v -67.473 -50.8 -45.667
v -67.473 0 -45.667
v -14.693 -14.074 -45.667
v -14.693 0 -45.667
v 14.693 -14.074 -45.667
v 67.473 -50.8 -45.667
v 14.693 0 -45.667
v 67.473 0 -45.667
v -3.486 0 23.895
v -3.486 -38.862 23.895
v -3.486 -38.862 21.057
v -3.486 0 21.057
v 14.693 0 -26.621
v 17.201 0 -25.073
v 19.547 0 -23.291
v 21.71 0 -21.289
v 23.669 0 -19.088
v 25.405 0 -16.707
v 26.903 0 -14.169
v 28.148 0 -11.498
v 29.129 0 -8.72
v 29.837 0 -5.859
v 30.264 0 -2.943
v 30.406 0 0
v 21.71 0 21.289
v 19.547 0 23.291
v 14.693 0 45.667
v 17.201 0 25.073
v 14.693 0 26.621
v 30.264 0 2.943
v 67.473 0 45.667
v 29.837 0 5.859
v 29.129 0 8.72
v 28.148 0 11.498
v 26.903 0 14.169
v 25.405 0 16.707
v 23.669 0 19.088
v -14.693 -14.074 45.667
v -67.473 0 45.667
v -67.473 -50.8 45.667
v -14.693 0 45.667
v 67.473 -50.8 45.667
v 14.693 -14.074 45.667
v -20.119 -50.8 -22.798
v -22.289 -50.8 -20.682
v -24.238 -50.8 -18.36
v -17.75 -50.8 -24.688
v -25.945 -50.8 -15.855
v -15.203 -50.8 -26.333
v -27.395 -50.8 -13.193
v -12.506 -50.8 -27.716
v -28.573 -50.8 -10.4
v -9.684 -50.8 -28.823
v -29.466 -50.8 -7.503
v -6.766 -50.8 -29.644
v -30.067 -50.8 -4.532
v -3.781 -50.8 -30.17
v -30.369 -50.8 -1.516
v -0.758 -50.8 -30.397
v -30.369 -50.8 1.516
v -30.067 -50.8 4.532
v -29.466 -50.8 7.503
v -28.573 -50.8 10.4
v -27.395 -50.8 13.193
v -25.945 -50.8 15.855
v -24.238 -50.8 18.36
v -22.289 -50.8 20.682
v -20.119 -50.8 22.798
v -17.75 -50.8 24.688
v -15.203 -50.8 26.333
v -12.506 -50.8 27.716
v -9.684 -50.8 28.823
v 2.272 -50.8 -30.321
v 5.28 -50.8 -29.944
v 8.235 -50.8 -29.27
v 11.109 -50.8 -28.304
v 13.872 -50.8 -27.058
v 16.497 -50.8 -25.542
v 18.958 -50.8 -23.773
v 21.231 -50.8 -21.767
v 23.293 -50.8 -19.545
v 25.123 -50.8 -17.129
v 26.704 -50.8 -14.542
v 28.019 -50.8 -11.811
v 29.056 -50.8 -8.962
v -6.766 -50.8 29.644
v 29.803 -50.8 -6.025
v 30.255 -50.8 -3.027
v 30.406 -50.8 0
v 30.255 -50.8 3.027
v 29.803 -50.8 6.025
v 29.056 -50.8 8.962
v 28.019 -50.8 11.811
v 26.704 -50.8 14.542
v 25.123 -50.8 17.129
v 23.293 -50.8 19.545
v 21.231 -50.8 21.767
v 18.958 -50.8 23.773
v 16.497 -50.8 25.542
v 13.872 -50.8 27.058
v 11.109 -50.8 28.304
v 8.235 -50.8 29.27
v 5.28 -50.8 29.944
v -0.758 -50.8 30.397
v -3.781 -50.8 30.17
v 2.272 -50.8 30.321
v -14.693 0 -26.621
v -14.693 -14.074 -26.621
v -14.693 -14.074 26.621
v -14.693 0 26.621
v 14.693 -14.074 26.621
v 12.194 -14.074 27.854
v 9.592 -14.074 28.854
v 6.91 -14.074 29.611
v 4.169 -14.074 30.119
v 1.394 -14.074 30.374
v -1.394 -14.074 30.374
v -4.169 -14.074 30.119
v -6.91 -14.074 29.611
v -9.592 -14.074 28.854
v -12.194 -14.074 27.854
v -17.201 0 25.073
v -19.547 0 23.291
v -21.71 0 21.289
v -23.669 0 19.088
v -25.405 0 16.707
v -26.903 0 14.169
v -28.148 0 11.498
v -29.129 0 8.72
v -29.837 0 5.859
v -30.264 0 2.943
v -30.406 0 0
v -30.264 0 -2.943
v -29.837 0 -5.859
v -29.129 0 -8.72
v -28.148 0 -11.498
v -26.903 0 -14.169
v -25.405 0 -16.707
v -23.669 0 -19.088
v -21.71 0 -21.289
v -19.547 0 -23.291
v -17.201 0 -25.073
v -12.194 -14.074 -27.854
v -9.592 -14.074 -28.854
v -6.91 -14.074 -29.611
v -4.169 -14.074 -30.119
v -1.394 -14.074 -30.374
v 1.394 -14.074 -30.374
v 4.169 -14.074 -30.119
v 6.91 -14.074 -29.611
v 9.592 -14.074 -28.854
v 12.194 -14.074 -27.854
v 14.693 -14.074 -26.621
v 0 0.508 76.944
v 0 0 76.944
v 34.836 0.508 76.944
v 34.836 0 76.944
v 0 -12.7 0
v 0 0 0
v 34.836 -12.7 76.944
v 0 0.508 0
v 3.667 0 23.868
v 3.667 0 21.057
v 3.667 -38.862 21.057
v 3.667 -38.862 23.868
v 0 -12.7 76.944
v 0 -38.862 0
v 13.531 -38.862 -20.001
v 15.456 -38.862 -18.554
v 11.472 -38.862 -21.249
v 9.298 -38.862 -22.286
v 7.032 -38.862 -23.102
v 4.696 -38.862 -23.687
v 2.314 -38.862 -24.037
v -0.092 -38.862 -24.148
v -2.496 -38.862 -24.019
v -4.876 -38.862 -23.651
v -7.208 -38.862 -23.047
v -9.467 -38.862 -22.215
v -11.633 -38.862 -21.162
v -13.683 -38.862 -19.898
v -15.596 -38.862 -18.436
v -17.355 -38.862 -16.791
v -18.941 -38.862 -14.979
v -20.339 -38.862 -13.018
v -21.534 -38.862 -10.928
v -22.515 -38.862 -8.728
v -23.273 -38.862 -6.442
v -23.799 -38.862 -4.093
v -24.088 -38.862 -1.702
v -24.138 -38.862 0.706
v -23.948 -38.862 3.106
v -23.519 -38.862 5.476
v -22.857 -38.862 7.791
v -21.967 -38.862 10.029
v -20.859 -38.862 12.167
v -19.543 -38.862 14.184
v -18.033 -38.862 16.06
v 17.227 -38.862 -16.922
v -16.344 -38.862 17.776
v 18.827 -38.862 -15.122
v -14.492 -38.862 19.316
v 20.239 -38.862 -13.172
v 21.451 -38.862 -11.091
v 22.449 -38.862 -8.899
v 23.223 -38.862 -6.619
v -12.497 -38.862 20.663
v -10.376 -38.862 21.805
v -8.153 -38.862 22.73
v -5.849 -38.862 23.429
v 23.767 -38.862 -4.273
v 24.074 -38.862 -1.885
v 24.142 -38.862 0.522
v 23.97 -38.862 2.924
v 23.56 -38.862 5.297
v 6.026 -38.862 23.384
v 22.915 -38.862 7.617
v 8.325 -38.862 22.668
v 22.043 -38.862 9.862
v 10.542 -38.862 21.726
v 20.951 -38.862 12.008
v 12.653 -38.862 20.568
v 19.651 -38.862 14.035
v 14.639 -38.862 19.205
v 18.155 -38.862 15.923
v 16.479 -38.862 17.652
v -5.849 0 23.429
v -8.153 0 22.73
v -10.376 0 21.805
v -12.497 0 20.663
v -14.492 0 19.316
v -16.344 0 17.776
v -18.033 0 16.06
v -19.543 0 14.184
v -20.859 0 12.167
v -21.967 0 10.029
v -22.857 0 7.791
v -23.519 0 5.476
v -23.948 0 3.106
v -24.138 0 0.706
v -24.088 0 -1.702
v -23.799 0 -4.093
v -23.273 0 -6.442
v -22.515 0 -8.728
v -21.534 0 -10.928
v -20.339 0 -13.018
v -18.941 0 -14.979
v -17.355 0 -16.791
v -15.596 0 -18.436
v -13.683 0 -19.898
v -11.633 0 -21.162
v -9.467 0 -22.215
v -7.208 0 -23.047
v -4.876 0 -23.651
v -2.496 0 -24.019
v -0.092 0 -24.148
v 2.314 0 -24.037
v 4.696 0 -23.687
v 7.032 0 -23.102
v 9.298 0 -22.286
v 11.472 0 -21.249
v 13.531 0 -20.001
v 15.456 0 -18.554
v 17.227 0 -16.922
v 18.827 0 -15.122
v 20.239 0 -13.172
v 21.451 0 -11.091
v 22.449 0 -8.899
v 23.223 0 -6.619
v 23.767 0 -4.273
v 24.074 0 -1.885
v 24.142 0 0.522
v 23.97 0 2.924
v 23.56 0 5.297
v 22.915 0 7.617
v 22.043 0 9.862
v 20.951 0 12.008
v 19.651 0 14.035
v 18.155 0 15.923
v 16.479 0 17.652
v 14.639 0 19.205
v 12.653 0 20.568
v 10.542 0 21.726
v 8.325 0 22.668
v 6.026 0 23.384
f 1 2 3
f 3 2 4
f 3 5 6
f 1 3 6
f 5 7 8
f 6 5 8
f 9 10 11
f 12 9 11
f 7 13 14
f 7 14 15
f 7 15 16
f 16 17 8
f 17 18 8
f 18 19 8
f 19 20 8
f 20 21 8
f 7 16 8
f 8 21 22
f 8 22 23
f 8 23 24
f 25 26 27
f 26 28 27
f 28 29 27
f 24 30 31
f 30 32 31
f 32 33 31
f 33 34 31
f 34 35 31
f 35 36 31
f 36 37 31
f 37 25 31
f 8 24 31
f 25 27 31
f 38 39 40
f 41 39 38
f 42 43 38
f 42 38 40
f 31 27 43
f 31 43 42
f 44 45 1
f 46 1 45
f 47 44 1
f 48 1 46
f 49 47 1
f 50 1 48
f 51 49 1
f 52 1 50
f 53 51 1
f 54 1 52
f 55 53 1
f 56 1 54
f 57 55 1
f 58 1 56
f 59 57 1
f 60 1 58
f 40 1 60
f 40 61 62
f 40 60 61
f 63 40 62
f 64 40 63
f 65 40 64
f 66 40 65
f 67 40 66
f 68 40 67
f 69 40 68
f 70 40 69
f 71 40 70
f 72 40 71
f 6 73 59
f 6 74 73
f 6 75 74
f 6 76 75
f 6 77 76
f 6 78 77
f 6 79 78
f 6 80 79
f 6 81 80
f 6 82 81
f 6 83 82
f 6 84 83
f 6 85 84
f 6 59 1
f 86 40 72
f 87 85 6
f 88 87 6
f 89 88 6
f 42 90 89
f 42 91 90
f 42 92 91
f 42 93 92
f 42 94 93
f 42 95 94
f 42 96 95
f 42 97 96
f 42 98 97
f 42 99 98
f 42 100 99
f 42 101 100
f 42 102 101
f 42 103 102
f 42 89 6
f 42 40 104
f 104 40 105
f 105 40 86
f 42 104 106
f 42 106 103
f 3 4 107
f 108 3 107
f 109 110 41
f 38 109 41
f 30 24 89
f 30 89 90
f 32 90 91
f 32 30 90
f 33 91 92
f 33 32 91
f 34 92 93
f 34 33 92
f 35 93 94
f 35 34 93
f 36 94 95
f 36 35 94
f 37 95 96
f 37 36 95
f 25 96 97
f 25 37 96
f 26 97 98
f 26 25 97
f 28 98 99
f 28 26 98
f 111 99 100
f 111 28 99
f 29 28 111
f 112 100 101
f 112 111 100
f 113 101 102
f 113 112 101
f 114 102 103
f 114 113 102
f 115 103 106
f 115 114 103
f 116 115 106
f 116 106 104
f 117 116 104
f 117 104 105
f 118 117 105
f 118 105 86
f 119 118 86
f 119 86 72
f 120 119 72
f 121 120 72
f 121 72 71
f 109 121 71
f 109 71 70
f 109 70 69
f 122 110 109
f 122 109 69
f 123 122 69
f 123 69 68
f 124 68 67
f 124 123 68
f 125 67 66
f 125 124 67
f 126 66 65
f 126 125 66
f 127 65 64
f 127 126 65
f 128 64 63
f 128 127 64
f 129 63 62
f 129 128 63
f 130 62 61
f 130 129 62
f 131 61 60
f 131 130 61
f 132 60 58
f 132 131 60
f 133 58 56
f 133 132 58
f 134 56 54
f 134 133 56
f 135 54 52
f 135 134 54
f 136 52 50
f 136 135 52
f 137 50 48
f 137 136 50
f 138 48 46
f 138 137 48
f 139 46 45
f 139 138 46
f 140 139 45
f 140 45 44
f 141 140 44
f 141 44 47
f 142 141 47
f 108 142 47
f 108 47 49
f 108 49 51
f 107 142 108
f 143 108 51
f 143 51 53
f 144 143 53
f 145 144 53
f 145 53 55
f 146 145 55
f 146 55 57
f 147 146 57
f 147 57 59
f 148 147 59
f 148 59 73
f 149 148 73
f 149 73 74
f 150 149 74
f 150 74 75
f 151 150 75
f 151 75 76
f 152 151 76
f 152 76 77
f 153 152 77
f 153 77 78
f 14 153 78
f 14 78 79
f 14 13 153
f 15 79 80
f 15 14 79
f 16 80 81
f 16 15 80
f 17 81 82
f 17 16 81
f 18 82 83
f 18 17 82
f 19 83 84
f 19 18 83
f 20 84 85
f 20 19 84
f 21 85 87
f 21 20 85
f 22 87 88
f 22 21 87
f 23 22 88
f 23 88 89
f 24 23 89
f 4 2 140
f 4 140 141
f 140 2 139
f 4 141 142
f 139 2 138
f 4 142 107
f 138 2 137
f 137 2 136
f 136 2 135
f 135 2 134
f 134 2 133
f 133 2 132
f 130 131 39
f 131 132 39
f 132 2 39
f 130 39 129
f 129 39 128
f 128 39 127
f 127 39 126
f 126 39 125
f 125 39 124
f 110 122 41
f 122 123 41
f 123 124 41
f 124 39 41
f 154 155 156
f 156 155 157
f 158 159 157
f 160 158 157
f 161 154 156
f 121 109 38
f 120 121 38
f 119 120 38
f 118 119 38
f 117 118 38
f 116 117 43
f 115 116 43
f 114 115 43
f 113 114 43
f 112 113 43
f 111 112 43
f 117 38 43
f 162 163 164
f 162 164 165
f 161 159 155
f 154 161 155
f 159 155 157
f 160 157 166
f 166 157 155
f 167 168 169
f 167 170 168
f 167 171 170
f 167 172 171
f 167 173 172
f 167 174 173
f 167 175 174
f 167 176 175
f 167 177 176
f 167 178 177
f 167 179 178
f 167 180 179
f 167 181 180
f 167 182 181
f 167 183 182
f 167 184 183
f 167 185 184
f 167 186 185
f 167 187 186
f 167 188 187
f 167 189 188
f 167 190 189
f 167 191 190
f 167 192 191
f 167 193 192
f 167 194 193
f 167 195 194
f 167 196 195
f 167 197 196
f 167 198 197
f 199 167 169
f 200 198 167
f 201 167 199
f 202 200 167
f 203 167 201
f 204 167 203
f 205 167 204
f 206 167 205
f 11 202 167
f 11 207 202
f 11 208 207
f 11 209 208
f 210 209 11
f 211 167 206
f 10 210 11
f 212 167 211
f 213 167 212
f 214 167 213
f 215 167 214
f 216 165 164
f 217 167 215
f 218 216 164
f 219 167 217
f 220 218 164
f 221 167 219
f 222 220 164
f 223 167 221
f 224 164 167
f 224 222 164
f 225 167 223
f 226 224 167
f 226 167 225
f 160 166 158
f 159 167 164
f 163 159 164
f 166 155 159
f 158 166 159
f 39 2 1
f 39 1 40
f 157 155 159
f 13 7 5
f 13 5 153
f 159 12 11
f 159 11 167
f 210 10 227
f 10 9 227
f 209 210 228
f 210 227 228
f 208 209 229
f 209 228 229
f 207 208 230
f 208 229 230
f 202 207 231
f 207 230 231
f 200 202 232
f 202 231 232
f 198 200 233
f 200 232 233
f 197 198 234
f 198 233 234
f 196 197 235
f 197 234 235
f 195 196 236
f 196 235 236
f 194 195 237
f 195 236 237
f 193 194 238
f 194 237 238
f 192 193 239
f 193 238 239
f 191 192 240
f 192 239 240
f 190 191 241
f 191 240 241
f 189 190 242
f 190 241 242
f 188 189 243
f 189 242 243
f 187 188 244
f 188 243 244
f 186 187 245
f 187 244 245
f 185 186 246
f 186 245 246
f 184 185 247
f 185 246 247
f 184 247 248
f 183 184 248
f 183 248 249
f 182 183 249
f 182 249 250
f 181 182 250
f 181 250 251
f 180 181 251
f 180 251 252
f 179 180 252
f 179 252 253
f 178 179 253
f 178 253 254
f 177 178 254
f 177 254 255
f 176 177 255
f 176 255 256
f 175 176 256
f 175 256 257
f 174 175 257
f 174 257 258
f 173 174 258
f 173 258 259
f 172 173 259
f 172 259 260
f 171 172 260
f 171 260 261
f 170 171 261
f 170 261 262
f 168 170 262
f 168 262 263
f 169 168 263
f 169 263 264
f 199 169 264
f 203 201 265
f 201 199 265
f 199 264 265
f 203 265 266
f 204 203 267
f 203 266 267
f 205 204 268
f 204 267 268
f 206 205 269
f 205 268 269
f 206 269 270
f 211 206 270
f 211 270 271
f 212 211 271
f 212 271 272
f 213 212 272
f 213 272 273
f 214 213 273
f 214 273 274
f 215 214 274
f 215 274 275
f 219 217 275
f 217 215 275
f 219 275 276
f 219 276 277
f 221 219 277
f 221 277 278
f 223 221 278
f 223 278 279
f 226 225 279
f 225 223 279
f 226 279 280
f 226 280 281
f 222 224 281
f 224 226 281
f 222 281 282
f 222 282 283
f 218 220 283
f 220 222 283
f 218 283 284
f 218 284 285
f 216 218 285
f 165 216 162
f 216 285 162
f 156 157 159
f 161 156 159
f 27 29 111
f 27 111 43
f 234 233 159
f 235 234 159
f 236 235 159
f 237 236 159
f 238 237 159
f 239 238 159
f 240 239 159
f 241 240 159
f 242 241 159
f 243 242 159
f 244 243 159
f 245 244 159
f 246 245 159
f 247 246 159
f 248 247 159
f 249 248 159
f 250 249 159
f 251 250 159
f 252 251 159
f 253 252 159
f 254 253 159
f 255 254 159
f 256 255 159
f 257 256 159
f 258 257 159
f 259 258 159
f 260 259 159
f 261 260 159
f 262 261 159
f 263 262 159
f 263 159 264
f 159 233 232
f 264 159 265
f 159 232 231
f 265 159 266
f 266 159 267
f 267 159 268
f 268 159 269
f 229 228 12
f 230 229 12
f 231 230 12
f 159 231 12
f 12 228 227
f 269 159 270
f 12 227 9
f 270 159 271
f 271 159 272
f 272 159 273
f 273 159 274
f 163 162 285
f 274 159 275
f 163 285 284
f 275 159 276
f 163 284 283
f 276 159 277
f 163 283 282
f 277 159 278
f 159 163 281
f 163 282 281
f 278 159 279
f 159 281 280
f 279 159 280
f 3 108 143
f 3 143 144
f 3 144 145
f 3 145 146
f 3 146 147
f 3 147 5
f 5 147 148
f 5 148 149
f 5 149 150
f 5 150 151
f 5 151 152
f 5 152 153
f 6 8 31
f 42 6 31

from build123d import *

# Parameters (mm, degrees)
F0_W      = 134.946704
F0_H      = 91.333538
F0_R      = 30.406377
F1_DEPTH  = 50.8
F2_W      = 29.386342
F2_H      = 189.831882
F3_DEPTH  = 14.073627
F4_R      = 24.148146
F5_DEPTH  = 38.861794
F7_DEPTH  = 47.989102
F9_DEPTH  = 12.7
F10_DEPTH = 0.508


with BuildPart() as f1:
    # F0 (on Front) → F1 (new body)
    with BuildSketch(Plane.XZ):
        Rectangle(F0_W, F0_H)
        Circle(F0_R, mode=Mode.SUBTRACT)
    extrude(amount=F1_DEPTH)

    # F2 (on Front) → F3 (cut)
    with BuildSketch(Plane.XZ):
        Rectangle(F2_W, F2_H)
    extrude(amount=F3_DEPTH, mode=Mode.SUBTRACT)


with BuildPart() as f5:
    # F4 (on Front) → F5 (new body)
    with BuildSketch(Plane.XZ):
        Circle(F4_R)
    extrude(amount=F5_DEPTH)

    # F6 (on face) → F7 (cut)
    with BuildSketch(Plane.XZ.offset(38.861794)):
        Polygon((3.667442, 21.057159), (0, 21.057159), (-3.485985, 21.057159), (0, 0), align=None)
        with BuildLine():
            Line((0, 21.057159), (0, 24.148146))
            ThreePointArc((0, 24.148146), (-1.747575, 24.084828), (-3.485985, 23.895206))
            Line((-3.485985, 23.895206), (-3.485985, 21.057159))
            Line((-3.485985, 21.057159), (0, 21.057159))
        make_face()
        with BuildLine():
            ThreePointArc((3.667442, 23.86803), (1.839062, 24.078015), (0, 24.148146))
            Line((0, 24.148146), (0, 21.057159))
            Line((0, 21.057159), (3.667442, 21.057159))
            Line((3.667442, 21.057159), (3.667442, 23.86803))
        make_face()
    extrude(amount=-F7_DEPTH, mode=Mode.SUBTRACT)


with BuildPart() as f9:
    # F8 (on Front) → F9 (new body)
    with BuildSketch(Plane.XZ):
        Polygon((34.836002, 76.943792), (0, 76.943792), (0, 0), align=None)
    extrude(amount=F9_DEPTH)


with BuildPart() as f10:
    # F9_face (on face) → F10 (new body)
    with BuildSketch(Plane(origin=(11.612001, 0, 51.295862), x_dir=(1, 0, 0), z_dir=(0, 1, 0))):
        Polygon((-11.612001, -25.647931), (23.224001, -25.647931), (-11.612001, 51.295862), align=None)
    extrude(amount=F10_DEPTH)


solid = Compound([f1.part, f5.part, f9.part, f10.part])
